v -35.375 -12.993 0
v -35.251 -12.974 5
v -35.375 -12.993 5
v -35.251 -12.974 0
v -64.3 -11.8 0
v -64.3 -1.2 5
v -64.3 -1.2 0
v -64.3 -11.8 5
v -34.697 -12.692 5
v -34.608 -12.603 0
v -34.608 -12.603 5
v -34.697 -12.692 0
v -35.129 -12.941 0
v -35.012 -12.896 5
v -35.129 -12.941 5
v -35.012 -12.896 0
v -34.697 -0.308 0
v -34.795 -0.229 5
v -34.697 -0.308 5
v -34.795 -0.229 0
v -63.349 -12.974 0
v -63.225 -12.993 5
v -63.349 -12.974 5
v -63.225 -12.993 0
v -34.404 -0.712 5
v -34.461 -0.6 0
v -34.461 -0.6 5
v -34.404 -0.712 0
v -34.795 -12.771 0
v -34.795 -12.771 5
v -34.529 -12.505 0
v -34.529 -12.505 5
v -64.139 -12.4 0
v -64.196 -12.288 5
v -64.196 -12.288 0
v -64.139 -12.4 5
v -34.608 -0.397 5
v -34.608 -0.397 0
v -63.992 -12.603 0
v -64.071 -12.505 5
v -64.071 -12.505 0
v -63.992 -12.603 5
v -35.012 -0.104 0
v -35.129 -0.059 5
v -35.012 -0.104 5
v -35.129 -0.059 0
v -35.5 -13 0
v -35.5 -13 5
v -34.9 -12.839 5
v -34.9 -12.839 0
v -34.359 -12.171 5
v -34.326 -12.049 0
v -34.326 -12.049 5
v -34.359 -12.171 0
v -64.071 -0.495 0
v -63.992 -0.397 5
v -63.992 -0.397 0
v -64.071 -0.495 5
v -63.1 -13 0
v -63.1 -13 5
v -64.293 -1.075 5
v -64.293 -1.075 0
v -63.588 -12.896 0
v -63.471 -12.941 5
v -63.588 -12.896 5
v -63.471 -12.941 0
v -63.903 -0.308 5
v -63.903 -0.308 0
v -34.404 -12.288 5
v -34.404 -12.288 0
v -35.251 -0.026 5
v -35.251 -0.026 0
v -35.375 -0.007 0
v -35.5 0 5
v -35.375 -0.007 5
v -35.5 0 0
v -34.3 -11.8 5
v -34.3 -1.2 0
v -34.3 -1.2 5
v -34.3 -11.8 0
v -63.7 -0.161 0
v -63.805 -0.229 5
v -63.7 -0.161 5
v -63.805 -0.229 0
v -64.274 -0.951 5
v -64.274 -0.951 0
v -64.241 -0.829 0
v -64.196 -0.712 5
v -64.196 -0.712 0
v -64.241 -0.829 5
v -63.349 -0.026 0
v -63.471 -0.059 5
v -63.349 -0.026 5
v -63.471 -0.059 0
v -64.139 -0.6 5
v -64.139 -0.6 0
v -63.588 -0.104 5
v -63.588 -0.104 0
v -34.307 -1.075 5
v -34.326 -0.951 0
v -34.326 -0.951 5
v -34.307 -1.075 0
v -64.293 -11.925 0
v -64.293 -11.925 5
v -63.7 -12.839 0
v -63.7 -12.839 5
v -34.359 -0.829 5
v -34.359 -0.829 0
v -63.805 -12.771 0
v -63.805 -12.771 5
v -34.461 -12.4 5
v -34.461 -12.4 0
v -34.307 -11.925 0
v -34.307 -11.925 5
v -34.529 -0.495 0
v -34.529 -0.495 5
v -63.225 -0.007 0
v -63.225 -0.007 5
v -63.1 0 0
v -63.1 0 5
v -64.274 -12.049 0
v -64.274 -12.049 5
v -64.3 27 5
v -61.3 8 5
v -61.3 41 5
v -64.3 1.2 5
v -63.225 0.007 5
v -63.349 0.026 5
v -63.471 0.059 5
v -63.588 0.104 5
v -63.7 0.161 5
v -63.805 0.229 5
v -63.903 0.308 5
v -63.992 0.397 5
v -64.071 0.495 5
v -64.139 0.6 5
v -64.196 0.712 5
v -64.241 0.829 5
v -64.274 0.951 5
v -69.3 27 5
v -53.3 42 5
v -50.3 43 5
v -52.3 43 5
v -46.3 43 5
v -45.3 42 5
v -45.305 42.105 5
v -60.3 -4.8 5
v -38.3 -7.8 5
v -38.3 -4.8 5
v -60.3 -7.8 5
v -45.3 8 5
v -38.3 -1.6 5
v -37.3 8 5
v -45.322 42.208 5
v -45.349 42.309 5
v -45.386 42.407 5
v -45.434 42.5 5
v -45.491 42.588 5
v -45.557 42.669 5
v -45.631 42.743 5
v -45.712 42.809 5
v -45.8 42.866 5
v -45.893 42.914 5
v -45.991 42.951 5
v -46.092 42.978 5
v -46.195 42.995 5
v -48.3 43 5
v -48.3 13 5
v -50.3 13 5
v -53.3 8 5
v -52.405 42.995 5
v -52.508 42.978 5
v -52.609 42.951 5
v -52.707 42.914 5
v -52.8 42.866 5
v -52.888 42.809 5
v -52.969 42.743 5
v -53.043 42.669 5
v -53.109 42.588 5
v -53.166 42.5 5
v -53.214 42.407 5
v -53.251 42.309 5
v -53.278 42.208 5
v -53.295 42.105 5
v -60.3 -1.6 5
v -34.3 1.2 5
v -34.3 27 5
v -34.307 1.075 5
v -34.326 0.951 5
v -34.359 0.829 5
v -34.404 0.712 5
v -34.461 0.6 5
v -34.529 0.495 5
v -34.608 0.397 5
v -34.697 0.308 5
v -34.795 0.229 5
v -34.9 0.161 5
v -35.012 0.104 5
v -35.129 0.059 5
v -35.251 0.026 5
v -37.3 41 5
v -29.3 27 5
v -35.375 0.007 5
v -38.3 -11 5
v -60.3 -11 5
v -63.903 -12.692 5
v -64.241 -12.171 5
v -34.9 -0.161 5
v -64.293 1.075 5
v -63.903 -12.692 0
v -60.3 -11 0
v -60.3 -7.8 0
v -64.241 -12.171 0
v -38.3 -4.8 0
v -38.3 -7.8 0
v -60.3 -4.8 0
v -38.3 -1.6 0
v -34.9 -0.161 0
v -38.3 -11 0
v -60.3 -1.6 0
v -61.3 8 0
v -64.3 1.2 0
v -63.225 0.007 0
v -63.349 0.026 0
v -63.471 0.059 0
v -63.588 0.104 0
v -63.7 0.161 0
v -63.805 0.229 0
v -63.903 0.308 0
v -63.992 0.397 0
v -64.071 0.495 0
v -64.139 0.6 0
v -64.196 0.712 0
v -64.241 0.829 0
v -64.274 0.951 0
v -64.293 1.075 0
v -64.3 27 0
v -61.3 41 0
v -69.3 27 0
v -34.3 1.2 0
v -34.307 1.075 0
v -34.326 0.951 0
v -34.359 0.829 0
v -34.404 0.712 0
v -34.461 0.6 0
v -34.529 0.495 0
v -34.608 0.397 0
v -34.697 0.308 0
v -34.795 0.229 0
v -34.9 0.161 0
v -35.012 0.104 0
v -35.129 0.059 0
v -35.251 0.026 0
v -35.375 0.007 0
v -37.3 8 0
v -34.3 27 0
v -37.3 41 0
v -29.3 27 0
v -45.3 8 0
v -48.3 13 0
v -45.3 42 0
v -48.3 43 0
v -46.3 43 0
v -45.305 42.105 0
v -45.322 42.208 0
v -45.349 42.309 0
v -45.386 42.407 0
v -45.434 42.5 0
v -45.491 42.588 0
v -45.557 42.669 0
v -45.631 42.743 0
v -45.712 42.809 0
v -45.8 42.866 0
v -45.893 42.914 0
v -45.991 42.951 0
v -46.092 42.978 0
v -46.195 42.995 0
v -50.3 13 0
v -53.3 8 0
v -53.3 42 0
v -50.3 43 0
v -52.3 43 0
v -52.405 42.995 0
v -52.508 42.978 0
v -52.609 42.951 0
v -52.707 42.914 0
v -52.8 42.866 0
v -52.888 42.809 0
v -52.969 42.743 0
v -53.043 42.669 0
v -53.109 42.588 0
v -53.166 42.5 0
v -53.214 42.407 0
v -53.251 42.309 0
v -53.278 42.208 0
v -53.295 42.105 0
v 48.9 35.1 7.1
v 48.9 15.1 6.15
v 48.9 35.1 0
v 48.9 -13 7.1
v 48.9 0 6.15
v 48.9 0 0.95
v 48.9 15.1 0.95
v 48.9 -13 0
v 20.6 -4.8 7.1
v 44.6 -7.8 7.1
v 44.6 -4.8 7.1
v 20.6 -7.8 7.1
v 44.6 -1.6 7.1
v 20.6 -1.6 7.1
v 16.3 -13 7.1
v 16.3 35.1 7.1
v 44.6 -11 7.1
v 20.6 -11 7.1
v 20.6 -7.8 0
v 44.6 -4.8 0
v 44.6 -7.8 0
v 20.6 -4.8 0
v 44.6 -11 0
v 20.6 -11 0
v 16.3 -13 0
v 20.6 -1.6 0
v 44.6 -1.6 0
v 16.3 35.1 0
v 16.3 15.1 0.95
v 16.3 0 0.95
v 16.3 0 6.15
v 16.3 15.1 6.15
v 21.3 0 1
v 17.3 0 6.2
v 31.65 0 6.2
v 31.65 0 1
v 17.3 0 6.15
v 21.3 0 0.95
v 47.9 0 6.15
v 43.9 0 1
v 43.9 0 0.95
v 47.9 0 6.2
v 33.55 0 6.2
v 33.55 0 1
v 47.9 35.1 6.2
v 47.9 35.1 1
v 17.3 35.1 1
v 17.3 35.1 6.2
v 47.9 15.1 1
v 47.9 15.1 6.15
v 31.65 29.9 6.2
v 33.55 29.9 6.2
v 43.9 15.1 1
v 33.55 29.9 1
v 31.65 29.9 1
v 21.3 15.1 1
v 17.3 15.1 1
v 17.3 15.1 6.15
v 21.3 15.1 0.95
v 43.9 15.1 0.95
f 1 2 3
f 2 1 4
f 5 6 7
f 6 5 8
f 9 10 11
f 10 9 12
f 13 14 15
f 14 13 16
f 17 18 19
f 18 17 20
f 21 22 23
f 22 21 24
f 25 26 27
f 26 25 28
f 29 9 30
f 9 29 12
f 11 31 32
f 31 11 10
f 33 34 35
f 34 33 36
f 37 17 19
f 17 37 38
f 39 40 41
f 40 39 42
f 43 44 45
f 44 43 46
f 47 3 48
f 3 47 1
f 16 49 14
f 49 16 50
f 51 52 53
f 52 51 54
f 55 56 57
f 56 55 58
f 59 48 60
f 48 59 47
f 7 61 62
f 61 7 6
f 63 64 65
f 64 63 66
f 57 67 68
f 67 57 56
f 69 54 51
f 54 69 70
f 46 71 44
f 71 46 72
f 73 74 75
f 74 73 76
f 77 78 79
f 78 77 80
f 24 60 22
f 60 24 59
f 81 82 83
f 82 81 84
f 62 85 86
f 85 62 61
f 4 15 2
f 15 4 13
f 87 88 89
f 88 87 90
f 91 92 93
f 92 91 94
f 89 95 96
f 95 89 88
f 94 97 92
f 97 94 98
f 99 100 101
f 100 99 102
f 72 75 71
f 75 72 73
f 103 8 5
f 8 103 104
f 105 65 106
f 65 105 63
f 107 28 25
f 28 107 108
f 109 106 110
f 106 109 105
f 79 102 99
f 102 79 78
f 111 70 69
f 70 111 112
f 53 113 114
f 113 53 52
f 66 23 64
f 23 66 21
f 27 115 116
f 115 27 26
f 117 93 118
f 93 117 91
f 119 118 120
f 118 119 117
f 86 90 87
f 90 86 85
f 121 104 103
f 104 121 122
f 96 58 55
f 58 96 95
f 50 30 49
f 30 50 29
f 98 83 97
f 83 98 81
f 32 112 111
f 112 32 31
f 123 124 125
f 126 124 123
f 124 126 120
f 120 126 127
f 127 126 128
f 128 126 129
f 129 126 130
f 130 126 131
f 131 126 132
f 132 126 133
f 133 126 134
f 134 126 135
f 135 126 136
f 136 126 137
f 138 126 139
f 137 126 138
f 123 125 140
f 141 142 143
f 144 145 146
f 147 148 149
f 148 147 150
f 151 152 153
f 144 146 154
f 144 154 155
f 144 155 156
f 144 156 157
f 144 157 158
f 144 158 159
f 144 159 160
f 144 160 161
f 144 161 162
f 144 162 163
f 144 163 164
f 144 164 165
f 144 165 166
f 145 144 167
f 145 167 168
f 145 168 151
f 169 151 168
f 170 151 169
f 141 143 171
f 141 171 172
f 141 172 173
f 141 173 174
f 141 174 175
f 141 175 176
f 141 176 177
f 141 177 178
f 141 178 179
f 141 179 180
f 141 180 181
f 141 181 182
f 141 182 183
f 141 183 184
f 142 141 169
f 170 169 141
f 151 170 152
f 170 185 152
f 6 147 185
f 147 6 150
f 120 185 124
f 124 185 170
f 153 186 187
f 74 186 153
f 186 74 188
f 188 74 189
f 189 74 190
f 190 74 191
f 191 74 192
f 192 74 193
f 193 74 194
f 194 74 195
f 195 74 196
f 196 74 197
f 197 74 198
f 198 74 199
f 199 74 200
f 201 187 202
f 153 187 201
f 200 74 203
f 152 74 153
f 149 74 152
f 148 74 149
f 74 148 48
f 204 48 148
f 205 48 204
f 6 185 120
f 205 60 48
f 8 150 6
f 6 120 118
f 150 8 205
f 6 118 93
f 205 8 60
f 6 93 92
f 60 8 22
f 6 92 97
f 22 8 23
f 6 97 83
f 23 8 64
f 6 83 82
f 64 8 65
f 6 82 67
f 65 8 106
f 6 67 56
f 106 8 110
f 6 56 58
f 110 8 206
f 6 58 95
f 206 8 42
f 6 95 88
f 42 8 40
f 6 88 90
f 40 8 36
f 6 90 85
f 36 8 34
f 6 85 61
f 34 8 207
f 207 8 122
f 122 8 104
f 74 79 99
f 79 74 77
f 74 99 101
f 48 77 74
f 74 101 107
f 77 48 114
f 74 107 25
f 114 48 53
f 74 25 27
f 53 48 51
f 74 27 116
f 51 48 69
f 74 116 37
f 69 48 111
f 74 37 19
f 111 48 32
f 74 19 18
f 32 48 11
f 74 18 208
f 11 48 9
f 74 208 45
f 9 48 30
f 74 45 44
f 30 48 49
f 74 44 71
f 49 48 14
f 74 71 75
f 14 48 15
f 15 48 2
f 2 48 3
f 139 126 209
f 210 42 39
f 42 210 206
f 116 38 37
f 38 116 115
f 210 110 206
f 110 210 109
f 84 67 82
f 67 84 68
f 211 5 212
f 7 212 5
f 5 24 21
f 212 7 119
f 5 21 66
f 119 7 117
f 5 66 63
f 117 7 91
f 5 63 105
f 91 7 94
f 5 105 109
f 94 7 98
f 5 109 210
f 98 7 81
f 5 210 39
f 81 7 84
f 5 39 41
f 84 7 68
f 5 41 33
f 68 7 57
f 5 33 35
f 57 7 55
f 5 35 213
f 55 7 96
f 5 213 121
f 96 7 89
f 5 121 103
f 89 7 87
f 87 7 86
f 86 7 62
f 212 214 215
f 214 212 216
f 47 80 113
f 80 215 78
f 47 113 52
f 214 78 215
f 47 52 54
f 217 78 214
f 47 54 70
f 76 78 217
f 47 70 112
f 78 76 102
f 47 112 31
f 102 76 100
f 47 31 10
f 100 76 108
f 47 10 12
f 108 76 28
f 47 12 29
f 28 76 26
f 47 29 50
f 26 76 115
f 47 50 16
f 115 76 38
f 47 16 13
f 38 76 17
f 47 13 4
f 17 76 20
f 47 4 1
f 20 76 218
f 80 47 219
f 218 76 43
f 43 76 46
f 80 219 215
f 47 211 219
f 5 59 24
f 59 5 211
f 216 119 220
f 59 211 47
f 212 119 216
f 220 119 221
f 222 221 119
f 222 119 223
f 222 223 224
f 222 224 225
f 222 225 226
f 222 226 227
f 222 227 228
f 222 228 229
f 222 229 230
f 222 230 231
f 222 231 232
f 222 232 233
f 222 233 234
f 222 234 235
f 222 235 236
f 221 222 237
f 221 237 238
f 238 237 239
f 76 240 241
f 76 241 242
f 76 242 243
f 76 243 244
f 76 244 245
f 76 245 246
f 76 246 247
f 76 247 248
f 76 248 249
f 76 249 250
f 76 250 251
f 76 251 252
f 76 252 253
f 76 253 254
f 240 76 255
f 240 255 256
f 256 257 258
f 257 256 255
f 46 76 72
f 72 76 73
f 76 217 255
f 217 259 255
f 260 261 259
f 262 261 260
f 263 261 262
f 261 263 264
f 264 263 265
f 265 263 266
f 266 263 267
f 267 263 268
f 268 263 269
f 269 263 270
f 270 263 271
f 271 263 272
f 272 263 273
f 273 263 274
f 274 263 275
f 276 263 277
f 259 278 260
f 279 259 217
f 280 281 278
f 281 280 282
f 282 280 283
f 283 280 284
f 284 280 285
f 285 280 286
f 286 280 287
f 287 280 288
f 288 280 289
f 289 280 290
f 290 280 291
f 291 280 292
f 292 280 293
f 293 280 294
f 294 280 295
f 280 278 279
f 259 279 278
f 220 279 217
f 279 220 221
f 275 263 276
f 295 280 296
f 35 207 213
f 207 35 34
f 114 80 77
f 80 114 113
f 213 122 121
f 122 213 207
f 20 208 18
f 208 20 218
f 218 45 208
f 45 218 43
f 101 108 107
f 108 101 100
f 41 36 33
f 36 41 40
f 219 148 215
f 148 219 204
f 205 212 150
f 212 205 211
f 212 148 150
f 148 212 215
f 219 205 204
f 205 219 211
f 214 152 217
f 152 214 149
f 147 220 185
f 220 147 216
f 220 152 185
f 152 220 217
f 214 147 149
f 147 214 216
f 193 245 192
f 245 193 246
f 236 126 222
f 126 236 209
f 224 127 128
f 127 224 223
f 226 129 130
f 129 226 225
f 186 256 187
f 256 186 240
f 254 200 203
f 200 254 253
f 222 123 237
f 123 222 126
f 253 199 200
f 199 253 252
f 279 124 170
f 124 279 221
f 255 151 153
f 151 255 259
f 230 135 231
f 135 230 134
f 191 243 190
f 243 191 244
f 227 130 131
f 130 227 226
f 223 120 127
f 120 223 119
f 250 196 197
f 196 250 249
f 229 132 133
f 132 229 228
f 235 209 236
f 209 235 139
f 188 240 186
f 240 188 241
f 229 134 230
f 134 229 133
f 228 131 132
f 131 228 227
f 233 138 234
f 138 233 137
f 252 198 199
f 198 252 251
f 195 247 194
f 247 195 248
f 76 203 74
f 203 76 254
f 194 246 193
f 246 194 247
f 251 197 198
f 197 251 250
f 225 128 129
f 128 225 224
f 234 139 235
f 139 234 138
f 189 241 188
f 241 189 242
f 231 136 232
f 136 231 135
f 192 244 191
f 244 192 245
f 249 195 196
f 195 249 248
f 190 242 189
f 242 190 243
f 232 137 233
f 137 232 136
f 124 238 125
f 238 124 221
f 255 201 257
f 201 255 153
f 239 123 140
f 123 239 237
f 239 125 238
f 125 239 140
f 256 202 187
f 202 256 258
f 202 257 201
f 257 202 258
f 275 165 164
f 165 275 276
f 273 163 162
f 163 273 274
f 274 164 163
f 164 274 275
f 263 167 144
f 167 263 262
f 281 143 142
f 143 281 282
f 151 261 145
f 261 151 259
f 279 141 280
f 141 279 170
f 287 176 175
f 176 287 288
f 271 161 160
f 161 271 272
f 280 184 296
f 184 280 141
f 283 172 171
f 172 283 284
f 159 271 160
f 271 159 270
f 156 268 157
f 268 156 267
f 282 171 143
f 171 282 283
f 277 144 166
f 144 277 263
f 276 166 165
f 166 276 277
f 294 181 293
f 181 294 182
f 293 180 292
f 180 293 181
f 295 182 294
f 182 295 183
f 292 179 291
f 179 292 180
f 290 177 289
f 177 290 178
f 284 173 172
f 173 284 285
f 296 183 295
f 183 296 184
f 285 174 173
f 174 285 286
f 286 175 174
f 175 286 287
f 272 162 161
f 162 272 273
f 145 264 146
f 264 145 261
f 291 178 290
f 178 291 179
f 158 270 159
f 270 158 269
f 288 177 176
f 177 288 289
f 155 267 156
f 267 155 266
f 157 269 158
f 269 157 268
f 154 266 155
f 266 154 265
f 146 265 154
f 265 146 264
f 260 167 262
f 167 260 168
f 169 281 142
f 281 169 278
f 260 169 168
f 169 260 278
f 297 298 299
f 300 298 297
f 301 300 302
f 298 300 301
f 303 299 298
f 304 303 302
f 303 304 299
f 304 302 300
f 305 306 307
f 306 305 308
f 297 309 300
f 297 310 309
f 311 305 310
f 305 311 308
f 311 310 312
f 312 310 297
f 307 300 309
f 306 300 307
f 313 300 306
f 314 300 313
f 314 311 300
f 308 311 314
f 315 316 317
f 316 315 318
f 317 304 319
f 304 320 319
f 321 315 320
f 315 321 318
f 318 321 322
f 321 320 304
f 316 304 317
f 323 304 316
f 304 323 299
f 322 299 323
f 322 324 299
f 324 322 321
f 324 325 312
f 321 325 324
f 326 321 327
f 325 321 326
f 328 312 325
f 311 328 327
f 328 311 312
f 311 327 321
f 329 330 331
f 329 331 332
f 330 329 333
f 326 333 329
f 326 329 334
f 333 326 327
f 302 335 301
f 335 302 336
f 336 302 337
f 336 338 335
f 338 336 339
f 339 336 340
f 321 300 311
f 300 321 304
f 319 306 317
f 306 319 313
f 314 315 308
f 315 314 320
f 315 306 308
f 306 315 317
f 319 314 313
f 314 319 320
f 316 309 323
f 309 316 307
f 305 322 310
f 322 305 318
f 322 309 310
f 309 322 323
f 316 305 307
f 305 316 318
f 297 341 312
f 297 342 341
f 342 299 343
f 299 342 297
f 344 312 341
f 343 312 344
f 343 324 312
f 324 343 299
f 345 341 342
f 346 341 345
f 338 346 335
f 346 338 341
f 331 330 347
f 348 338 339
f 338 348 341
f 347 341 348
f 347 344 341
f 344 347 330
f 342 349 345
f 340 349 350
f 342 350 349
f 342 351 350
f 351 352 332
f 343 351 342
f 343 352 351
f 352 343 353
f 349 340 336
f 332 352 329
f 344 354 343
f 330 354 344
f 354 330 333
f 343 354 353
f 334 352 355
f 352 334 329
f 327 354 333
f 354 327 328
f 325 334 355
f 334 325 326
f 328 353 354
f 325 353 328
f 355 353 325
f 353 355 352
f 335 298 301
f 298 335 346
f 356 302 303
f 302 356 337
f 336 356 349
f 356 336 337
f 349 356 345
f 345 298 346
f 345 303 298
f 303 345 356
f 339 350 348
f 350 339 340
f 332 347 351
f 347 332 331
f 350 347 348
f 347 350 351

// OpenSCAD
// connector_combined.scad
// Snap buckle connector with male and female parts.
// The male part has:
// - strap holder base
// - two flexible arms
// - solid triangle locking heads
// - center guide slot
//
// The female part has:
// - strap holder base
// - receiver body
// - inner tunnel
// - side locking openings
// - center guide rail

$fn = 60;


// ============================================================
// Shared preview settings
// ============================================================

preview_gap = 18;


// ============================================================
// Male connector parameters
// ============================================================

male_thickness = 5;

male_base_width  = 30;
male_base_depth  = 8;

male_arm_width = 3;
male_arm_total_length = 34;

triangle_base = 8;
triangle_height = 14;

male_arm_body_length = male_arm_total_length - triangle_height;

male_center_width = 8;
male_center_length = 35;

male_slot_width = 2;
male_slot_margin_bottom = 5;

male_arm_overlap_into_base = 1.5;
male_head_overlap = 1.0;

male_rounding = 1.2;


// Male bag-style strap holder base
male_strap_base_width = 30;
male_strap_base_height = 13;
male_strap_base_depth = 5;

male_strap_slot_width = 22;
male_strap_slot_height = 3.2;
male_strap_bar_height = 3;


// ============================================================
// Female connector parameters
// ============================================================

female_main_width = 32.6;
female_main_height = 35.1;
female_main_depth = 7.1;

female_cut_width = 30.6;
female_cut_height = 35.1;
female_cut_depth = 5.1;

female_line_width = 1.9;
female_line_height = 29.9;
female_line_depth = 7.1;

female_base_width = 32.6;
female_base_height = 13;
female_base_depth = 7.1;

female_strap_slot_width = 24;
female_strap_slot_height = 3.2;
female_strap_bar_height = 3;

female_side_hole_width = 5;
female_side_hole_height = 15.1;
female_side_hole_depth = 5.2;


// ============================================================
// Helper modules
// ============================================================

module rounded_box(size=[10,10,4], r=1) {
    hull() {
        translate([r, r, 0])
            cylinder(h=size[2], r=r);

        translate([size[0]-r, r, 0])
            cylinder(h=size[2], r=r);

        translate([r, size[1]-r, 0])
            cylinder(h=size[2], r=r);

        translate([size[0]-r, size[1]-r, 0])
            cylinder(h=size[2], r=r);
    }
}


// Left triangle head.
// The vertical edge connects to the left arm.
// The point extends outward to the left.
module triangle_left_2d(width, height) {
    polygon(points=[
        [0, 0],
        [0, height],
        [-width, 0]
    ]);
}


// Right triangle head.
// The vertical edge connects to the right arm.
// The point extends outward to the right.
module triangle_right_2d(width, height) {
    polygon(points=[
        [0, 0],
        [0, height],
        [width, 0]
    ]);
}


module triangle_left_head(width, height, thickness) {
    linear_extrude(height = thickness)
        triangle_left_2d(width, height);
}


module triangle_right_head(width, height, thickness) {
    linear_extrude(height = thickness)
        triangle_right_2d(width, height);
}


// ============================================================
// Male connector
// ============================================================

module male_connector() {

    difference() {

        union() {

            // Male strap holder base
            difference() {
                translate([-male_strap_base_width/2, -male_strap_base_height, 0])
                    rounded_box(
                        [
                            male_strap_base_width,
                            male_strap_base_height,
                            male_strap_base_depth
                        ],
                        r = male_rounding
                    );

                // First strap slot
                translate([
                    -male_strap_slot_width/2,
                    -male_strap_base_height + 2,
                    -0.1
                ])
                    cube([
                        male_strap_slot_width,
                        male_strap_slot_height,
                        male_strap_base_depth + 0.2
                    ]);

                // Second strap slot
                translate([
                    -male_strap_slot_width/2,
                    -male_strap_base_height + 2 + male_strap_slot_height + male_strap_bar_height,
                    -0.1
                ])
                    cube([
                        male_strap_slot_width,
                        male_strap_slot_height,
                        male_strap_base_depth + 0.2
                    ]);
            }


            // Front base bridge
            translate([-male_base_width/2, 0, 0])
                rounded_box(
                    [
                        male_base_width,
                        male_base_depth,
                        male_thickness
                    ],
                    r = male_rounding
                );


            // Left flexible arm
            translate([
                -male_base_width/2,
                male_base_depth - male_arm_overlap_into_base,
                0
            ])
                cube([
                    male_arm_width,
                    male_arm_body_length + male_arm_overlap_into_base,
                    male_thickness
                ]);


            // Right flexible arm
            translate([
                male_base_width/2 - male_arm_width,
                male_base_depth - male_arm_overlap_into_base,
                0
            ])
                cube([
                    male_arm_width,
                    male_arm_body_length + male_arm_overlap_into_base,
                    male_thickness
                ]);


            // Left triangle locking head
            translate([
                -male_base_width/2 + male_arm_width,
                male_base_depth + male_arm_body_length - male_head_overlap,
                0
            ])
                triangle_left_head(
                    triangle_base,
                    triangle_height,
                    male_thickness
                );


            // Right triangle locking head
            translate([
                male_base_width/2 - male_arm_width,
                male_base_depth + male_arm_body_length - male_head_overlap,
                0
            ])
                triangle_right_head(
                    triangle_base,
                    triangle_height,
                    male_thickness
                );


            // Center guide
            translate([
                -male_center_width/2,
                male_base_depth - male_arm_overlap_into_base,
                0
            ])
                rounded_box(
                    [
                        male_center_width,
                        male_center_length + male_arm_overlap_into_base,
                        male_thickness
                    ],
                    r = 1
                );
        }


        // Slot in the center guide
        translate([
            -male_slot_width/2,
            male_base_depth + male_slot_margin_bottom,
            -0.1
        ])
            cube([
                male_slot_width,
                male_center_length + 5,
                male_thickness + 0.2
            ]);
    }
}


// ============================================================
// Female connector
// ============================================================

module female_connector() {

    union() {

        // ----------------------------------------------------
        // Female strap holder base
        // ----------------------------------------------------

        difference() {

            // Solid base behind the receiver
            translate([0, -female_base_height, 0])
                cube([
                    female_base_width,
                    female_base_height,
                    female_base_depth
                ]);


            // First strap slot
            translate([
                (female_base_width - female_strap_slot_width) / 2,
                -female_base_height + 2,
                -0.1
            ])
                cube([
                    female_strap_slot_width,
                    female_strap_slot_height,
                    female_base_depth + 0.2
                ]);


            // Second strap slot
            translate([
                (female_base_width - female_strap_slot_width) / 2,
                -female_base_height + 2 + female_strap_slot_height + female_strap_bar_height,
                -0.1
            ])
                cube([
                    female_strap_slot_width,
                    female_strap_slot_height,
                    female_base_depth + 0.2
                ]);
        }


        // ----------------------------------------------------
        // Female receiver body
        // ----------------------------------------------------

        difference() {

            // Outer receiver block
            cube([
                female_main_width,
                female_main_height,
                female_main_depth
            ]);


            // Internal cutout where the male connector slides in
            translate([
                (female_main_width - female_cut_width) / 2,
                (female_main_height - female_cut_height) / 2,
                (female_main_depth - female_cut_depth) / 2
            ])
                cube([
                    female_cut_width,
                    female_cut_height,
                    female_cut_depth + 0.1
                ]);


            // Left locking opening
            translate([
                -0.1,
                0,
                (female_main_depth - female_side_hole_depth) / 2
            ])
                cube([
                    female_side_hole_width + 0.1,
                    female_side_hole_height,
                    female_side_hole_depth
                ]);


            // Right locking opening
            translate([
                female_main_width - female_side_hole_width,
                0,
                (female_main_depth - female_side_hole_depth) / 2
            ])
                cube([
                    female_side_hole_width + 0.1,
                    female_side_hole_height,
                    female_side_hole_depth
                ]);
        }


        // Center guide rail
        translate([
            (female_main_width - female_line_width) / 2,
            0,
            0
        ])
            cube([
                female_line_width,
                female_line_height,
                female_line_depth
            ]);
    }
}


// ============================================================
// Final layout
// ============================================================

// Male part on the left
translate([
    -male_base_width/2 - female_main_width/2 - preview_gap,
    0,
    0
])
    male_connector();


// Female part on the right
translate([
    female_main_width/2,
    0,
    0
])
    female_connector();
